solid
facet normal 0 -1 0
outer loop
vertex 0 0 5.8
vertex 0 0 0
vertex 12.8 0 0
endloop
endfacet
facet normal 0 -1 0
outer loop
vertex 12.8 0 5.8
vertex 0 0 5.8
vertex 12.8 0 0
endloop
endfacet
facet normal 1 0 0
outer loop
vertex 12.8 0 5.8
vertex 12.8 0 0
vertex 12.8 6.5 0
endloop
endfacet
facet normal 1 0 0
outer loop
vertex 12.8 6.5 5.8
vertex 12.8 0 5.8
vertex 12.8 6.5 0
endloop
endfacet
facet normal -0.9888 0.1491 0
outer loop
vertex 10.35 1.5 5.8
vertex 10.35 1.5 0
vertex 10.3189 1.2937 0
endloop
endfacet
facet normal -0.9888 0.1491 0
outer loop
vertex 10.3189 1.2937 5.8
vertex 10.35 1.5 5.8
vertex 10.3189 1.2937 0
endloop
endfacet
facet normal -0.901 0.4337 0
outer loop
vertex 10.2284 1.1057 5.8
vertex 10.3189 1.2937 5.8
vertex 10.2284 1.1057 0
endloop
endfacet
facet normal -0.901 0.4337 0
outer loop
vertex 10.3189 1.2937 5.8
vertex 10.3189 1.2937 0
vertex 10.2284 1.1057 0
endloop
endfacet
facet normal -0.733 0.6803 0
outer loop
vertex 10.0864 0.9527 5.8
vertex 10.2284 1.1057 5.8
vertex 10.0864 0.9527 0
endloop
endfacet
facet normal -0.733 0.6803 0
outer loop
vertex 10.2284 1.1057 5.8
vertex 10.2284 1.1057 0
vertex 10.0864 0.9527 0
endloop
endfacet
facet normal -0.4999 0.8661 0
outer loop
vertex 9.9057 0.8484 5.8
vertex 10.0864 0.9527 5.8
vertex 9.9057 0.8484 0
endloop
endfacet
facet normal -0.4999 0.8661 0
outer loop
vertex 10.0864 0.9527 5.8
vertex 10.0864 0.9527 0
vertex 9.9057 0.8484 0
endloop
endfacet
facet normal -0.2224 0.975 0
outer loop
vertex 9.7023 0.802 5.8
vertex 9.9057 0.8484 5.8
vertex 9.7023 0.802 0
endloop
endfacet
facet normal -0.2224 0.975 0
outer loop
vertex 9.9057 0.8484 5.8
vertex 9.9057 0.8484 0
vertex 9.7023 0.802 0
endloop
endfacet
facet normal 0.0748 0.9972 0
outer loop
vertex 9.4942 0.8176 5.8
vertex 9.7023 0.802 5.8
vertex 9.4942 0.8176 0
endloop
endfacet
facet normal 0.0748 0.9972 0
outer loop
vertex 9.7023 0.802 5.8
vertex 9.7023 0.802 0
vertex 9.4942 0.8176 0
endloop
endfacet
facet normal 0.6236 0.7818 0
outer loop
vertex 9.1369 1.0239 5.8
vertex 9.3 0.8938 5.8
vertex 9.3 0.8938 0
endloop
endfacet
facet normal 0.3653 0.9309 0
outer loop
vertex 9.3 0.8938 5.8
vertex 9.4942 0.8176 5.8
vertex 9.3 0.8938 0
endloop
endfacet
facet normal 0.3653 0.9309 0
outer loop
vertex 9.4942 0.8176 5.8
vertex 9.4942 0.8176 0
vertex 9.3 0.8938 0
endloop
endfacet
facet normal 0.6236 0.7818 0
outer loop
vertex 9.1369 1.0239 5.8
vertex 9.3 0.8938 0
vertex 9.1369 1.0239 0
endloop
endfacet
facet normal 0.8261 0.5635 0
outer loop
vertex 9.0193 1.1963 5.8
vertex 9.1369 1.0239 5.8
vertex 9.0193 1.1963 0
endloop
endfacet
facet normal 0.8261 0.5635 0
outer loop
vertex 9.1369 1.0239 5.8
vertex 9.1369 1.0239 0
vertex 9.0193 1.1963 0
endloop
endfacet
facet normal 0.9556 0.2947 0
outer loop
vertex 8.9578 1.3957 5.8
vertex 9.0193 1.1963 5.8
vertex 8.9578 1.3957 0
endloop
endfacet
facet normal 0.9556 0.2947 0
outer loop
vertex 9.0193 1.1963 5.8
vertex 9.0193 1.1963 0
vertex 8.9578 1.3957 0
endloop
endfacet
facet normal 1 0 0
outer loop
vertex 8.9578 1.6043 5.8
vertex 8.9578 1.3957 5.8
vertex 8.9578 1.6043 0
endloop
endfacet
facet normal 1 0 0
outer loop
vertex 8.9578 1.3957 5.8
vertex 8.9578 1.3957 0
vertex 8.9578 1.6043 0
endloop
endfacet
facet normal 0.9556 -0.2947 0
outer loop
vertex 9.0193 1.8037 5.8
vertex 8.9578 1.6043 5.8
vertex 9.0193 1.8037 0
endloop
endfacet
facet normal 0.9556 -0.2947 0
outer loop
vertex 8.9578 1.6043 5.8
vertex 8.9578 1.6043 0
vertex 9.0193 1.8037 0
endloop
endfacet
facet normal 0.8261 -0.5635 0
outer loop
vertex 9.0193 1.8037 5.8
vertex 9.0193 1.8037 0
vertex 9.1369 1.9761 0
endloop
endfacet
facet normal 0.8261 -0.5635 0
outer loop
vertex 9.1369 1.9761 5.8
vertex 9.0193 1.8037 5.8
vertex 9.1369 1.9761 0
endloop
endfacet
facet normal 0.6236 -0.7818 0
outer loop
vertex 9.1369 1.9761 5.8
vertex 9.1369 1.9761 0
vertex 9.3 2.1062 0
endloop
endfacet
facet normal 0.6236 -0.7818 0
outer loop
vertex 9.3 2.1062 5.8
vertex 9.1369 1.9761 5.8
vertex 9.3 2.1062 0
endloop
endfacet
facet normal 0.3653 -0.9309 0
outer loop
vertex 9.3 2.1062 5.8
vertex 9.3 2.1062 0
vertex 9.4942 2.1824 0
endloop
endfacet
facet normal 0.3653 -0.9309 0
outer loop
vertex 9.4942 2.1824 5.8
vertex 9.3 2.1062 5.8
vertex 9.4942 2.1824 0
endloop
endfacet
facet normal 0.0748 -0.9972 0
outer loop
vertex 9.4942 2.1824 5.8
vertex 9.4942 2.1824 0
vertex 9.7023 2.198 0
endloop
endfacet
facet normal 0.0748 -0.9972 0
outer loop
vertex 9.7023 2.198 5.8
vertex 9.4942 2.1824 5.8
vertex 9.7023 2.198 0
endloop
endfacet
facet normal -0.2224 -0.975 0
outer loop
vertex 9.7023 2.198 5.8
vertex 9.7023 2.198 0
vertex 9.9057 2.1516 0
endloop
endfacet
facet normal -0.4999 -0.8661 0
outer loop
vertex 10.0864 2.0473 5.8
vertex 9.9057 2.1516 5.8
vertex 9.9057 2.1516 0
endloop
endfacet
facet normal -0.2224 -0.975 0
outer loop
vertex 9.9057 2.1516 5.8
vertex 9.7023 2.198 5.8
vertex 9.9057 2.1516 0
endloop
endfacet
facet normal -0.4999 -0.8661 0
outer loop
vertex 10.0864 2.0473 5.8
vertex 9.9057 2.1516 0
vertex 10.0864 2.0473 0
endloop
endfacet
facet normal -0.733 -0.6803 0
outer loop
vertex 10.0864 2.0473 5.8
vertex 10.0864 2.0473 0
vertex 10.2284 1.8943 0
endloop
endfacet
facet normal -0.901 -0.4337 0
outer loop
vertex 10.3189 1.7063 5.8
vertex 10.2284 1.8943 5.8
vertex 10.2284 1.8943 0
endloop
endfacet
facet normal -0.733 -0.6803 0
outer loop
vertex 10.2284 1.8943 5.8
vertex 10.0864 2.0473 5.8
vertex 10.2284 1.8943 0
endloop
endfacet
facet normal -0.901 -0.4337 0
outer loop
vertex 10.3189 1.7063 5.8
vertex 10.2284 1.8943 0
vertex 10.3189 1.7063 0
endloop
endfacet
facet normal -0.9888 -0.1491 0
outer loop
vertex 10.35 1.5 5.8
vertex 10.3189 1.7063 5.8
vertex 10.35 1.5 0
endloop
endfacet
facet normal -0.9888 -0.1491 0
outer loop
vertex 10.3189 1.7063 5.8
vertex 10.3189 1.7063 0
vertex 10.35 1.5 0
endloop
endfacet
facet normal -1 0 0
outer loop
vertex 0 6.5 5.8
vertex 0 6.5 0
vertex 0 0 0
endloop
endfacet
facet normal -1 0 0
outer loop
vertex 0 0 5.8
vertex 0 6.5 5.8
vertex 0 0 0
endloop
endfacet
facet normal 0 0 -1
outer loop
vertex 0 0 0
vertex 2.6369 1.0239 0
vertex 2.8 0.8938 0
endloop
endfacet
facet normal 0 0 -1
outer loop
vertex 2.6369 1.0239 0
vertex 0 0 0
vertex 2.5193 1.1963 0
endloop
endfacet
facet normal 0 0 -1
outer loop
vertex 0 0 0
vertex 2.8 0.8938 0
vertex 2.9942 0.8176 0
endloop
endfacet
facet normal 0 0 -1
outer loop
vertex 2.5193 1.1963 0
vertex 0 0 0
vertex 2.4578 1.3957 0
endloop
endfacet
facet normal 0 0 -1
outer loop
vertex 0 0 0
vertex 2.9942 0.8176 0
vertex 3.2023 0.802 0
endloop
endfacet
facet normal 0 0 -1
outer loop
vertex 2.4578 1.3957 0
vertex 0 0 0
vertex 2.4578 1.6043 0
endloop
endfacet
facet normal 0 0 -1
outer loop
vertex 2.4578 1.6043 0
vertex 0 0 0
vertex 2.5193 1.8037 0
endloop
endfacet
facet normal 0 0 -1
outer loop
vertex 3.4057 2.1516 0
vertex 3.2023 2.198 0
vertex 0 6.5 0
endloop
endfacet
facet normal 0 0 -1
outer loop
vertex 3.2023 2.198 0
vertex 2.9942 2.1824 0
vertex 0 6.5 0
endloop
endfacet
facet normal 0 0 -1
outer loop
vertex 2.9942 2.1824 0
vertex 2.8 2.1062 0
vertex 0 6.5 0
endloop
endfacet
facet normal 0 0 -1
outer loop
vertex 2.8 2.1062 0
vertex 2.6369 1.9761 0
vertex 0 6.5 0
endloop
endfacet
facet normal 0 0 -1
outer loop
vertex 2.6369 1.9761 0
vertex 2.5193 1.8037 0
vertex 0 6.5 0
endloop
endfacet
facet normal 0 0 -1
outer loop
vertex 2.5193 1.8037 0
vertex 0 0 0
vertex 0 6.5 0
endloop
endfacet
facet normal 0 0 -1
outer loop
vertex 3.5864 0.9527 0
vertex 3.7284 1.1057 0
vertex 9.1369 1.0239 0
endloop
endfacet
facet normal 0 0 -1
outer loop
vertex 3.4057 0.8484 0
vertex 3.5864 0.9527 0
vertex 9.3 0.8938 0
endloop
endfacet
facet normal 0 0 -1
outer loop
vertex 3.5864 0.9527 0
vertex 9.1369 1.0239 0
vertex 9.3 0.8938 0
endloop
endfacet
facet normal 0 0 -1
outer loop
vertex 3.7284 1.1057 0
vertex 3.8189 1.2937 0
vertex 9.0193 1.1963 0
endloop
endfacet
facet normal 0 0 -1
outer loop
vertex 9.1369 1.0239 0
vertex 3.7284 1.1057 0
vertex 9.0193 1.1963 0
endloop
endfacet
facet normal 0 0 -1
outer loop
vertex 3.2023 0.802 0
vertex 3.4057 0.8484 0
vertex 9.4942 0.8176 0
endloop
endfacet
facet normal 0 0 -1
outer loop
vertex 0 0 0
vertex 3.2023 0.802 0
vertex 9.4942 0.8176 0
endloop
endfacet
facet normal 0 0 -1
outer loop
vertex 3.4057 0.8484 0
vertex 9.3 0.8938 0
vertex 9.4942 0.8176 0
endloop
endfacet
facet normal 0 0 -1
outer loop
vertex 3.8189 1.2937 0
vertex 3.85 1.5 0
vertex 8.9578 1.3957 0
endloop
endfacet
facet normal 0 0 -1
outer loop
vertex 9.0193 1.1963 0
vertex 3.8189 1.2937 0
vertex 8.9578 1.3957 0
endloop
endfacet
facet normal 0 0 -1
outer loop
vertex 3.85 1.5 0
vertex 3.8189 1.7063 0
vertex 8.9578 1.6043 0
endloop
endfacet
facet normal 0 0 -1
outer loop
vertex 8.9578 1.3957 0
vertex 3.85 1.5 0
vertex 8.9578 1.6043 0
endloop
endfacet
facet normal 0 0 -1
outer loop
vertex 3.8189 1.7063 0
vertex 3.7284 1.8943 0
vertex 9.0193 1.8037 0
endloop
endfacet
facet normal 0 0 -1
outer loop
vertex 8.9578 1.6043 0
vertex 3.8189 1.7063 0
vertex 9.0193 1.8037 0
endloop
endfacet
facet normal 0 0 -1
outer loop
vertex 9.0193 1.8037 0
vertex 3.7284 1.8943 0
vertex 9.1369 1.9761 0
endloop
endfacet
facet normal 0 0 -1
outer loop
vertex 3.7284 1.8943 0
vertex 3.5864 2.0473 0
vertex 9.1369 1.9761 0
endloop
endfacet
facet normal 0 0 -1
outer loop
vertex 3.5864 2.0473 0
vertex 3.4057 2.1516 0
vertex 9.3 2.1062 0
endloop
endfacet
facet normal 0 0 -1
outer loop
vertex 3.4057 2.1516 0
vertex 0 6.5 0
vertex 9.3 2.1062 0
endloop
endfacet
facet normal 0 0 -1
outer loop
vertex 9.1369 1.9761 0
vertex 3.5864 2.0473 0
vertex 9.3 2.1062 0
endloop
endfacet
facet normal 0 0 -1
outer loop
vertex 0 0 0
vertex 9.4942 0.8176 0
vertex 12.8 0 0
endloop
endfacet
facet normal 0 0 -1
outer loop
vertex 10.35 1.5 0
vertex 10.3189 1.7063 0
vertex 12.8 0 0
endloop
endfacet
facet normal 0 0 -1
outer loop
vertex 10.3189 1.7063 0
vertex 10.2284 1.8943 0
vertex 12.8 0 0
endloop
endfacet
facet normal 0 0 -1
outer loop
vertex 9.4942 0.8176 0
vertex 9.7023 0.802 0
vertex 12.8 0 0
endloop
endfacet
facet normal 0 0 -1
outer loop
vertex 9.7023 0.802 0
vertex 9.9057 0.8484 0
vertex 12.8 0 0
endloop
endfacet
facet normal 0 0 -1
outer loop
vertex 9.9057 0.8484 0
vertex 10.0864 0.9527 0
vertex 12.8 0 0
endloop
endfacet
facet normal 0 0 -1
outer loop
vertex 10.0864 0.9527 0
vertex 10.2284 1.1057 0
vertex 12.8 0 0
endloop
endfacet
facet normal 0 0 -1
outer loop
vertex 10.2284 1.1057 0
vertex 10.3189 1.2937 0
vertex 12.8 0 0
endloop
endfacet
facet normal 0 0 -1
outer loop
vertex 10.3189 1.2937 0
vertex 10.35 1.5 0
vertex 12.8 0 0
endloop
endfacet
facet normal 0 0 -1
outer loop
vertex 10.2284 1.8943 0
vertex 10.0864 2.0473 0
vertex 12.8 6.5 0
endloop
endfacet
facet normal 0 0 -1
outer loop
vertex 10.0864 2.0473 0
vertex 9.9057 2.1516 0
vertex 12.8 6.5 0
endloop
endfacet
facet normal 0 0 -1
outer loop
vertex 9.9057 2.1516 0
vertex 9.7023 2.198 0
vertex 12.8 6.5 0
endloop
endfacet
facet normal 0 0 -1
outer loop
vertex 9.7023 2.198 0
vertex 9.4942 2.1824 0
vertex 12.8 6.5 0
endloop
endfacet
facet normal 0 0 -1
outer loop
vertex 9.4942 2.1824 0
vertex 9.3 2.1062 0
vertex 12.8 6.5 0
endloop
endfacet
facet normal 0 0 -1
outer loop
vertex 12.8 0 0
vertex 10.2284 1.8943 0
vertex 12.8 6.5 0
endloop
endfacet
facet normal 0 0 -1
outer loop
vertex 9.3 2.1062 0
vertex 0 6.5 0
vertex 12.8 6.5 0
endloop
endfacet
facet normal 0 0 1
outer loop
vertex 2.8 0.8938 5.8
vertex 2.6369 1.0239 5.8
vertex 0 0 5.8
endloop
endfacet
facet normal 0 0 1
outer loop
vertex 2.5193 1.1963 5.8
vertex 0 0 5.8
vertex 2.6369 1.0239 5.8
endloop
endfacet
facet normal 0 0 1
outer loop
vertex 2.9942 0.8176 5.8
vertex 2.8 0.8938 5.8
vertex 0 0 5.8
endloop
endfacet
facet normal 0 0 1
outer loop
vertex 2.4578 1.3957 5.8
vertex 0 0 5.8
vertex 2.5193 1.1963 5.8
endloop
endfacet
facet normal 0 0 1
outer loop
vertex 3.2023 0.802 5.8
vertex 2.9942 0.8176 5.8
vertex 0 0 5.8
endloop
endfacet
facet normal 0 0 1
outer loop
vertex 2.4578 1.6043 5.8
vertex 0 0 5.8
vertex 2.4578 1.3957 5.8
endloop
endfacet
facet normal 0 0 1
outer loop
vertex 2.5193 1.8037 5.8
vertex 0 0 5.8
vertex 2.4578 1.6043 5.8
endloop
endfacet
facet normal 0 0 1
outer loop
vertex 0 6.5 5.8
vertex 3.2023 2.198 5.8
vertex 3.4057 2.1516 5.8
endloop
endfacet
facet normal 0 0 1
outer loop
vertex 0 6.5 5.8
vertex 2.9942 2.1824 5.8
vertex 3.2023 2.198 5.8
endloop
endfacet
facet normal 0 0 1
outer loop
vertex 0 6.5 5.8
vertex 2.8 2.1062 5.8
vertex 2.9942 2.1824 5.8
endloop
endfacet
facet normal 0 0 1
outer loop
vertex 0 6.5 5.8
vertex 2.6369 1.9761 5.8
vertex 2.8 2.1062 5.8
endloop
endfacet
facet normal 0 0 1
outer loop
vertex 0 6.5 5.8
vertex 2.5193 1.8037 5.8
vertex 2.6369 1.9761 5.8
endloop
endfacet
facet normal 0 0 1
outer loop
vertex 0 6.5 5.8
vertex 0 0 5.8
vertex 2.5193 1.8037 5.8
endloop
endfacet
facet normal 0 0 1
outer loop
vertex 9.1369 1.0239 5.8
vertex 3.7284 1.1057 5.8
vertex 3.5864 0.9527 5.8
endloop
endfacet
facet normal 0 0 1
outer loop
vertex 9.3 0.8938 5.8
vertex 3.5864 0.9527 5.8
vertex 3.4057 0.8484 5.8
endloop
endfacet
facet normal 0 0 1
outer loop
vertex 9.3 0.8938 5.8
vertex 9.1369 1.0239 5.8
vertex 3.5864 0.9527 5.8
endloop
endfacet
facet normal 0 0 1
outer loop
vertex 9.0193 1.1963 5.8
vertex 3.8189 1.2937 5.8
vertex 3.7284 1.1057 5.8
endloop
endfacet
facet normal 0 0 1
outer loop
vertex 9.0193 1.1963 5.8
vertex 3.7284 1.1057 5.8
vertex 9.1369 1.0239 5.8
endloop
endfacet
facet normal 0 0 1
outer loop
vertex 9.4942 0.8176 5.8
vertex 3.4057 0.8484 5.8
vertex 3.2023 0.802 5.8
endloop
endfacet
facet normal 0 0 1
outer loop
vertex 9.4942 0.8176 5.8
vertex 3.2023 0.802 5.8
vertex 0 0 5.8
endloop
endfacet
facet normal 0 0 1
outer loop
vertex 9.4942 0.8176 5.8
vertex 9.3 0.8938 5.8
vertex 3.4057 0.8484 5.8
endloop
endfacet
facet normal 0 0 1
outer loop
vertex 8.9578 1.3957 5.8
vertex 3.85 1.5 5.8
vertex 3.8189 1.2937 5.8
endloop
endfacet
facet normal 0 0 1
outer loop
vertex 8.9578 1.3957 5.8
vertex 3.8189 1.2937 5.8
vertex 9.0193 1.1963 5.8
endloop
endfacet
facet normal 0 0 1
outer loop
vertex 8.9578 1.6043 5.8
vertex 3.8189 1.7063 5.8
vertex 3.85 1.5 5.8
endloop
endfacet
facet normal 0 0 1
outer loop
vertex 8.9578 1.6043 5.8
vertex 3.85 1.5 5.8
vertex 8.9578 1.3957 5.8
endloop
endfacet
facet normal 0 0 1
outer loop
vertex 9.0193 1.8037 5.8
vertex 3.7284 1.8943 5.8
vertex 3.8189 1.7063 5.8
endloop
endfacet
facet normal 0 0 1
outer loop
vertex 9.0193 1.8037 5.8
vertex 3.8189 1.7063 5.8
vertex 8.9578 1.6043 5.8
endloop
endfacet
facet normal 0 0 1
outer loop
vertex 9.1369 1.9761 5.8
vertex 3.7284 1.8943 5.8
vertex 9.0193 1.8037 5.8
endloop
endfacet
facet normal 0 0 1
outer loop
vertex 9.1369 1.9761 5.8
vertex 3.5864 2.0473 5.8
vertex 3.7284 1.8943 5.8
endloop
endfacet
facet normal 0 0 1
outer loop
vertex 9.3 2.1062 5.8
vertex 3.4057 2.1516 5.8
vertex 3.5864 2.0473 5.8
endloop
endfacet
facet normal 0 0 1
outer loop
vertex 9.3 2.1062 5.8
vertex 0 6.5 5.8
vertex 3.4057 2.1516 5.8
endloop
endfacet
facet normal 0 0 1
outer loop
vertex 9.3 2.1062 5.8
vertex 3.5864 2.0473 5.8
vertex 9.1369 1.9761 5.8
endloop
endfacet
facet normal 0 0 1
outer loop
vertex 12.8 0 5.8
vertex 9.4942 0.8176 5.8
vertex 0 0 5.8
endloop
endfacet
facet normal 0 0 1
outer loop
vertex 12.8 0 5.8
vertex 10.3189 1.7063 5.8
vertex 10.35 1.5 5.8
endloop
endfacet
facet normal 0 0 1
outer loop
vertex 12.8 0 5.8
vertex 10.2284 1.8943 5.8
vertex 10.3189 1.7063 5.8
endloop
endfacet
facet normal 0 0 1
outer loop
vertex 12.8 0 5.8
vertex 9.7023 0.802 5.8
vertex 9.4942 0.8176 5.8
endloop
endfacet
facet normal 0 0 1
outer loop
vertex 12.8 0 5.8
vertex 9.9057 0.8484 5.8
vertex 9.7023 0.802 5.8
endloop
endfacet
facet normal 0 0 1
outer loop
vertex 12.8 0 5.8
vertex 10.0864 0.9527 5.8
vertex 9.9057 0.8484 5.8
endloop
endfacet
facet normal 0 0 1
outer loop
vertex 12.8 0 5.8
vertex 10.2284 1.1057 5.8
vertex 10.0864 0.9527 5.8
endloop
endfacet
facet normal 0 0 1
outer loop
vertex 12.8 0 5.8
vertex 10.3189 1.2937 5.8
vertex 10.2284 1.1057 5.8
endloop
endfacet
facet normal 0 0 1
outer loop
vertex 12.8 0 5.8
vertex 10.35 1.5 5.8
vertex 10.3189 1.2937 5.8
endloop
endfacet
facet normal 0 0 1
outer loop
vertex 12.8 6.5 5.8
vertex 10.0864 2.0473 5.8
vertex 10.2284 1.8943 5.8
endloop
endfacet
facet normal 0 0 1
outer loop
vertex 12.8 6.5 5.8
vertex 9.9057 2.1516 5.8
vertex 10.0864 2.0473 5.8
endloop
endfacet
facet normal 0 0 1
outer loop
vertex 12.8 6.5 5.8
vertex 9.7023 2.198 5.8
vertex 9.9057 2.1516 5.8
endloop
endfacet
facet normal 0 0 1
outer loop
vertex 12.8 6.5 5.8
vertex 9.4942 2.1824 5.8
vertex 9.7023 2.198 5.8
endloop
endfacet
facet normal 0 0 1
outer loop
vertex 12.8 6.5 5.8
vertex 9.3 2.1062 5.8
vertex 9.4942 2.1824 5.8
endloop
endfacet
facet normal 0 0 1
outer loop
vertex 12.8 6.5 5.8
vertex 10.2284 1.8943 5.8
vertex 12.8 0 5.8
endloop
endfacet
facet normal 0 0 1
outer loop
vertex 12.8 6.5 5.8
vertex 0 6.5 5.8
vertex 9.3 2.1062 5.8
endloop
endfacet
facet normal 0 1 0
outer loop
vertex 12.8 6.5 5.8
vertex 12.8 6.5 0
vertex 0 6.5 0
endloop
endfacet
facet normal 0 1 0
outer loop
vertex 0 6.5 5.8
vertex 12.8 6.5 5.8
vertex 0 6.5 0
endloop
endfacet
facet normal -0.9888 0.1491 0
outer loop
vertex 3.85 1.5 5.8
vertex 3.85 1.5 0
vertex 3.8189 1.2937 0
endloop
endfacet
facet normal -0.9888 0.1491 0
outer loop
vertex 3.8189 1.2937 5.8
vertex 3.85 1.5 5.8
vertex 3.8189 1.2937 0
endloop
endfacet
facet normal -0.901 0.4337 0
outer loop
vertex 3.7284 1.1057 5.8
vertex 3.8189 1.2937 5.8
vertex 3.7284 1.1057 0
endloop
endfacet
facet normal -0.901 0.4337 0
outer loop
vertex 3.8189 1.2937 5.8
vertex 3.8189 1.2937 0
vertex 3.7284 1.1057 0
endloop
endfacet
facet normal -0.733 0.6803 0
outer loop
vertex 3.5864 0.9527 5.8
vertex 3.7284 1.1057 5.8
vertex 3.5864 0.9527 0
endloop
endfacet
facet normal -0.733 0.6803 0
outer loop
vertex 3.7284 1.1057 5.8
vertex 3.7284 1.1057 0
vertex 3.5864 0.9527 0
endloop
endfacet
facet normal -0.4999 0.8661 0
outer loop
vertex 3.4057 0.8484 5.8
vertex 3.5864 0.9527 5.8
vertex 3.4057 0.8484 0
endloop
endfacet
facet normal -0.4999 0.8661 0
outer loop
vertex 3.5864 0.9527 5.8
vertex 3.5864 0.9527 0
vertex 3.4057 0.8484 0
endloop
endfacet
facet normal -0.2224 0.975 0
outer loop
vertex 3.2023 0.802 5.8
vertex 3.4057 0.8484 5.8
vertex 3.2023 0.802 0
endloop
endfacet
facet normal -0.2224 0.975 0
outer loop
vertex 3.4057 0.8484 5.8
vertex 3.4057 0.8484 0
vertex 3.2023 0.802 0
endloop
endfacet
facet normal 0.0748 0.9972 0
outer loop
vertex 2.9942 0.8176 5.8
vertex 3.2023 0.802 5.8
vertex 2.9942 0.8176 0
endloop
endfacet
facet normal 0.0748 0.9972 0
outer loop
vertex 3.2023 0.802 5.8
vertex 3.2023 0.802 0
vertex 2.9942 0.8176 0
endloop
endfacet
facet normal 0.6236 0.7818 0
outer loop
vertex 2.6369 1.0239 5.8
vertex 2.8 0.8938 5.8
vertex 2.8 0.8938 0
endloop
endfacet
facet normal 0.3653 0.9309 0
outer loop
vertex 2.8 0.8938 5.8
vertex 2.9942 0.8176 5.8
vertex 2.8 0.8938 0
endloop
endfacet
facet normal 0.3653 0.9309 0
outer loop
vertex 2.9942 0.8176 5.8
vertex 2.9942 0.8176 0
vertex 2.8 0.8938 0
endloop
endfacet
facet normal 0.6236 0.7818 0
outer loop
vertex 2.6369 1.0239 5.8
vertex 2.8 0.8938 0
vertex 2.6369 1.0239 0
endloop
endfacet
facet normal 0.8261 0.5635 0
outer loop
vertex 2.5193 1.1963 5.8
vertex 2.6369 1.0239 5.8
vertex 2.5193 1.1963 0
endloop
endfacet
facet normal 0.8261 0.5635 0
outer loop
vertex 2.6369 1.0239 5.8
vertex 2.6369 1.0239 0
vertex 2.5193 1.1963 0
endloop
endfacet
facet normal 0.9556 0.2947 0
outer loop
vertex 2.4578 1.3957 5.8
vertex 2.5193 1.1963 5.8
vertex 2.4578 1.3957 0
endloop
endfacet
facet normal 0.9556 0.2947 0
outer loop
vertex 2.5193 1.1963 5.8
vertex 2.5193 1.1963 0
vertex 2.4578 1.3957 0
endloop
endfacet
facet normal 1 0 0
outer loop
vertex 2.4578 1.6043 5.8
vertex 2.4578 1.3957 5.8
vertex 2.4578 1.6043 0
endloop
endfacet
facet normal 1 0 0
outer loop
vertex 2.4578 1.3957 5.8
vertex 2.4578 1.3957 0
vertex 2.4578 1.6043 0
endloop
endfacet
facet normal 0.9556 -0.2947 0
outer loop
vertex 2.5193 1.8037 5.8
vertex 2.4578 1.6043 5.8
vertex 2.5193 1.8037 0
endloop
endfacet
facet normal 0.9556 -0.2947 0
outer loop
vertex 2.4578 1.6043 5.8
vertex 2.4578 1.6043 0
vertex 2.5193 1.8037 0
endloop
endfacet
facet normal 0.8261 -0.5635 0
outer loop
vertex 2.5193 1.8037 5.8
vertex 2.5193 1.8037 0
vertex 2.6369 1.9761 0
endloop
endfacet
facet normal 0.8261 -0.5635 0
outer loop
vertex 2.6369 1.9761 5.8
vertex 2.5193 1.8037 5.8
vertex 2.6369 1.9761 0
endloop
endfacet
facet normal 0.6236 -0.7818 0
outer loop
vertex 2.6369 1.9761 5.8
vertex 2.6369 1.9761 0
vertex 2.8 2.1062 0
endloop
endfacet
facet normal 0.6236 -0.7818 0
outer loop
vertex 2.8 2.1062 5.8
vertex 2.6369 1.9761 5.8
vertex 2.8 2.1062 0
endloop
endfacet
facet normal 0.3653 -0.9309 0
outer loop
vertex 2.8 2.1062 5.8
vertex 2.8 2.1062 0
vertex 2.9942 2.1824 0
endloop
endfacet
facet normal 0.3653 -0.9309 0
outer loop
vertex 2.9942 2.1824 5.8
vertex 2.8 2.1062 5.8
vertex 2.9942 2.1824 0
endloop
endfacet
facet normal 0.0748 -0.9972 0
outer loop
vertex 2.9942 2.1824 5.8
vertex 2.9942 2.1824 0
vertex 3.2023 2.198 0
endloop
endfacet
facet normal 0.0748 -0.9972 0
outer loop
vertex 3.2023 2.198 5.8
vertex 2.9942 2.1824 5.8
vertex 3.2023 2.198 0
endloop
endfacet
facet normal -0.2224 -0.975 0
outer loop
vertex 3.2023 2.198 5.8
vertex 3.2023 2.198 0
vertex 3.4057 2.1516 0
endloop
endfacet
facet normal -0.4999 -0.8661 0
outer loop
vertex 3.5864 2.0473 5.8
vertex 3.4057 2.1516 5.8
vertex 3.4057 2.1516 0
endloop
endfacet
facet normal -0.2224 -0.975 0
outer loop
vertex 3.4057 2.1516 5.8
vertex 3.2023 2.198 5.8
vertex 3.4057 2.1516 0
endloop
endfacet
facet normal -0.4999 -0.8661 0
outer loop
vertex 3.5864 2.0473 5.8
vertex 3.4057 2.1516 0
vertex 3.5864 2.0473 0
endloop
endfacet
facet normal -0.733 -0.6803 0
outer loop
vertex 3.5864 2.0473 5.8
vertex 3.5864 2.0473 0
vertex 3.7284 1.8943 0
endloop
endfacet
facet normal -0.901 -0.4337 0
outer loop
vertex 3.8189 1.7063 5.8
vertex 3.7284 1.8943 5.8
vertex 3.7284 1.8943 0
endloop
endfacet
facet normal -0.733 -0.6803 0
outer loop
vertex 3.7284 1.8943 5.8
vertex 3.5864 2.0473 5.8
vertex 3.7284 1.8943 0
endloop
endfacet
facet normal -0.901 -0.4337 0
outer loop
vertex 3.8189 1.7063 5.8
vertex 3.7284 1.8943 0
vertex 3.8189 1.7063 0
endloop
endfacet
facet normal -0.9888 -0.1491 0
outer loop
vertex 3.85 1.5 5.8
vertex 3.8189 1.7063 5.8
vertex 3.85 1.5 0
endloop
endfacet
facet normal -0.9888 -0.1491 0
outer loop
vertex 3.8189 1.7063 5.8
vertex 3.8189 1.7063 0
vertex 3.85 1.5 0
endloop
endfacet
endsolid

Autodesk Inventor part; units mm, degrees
ref_plane "YZ Plane" through (0, 0, 0) normal (1, 0, 0) x (0, 1, 0)
ref_plane "XZ Plane" through (0, 0, 0) normal (0, 1, 0) x (-1, 0, 0)
ref_plane "XY Plane" through (0, 0, 0) normal (0, 0, 1) x (1, 0, 0)
sketch "Skizze1" plane through (0, 0, 0) normal (0, 0, 1) x (1, 0, 0)
  line L0 (0, 0) -> (12.8, 0)
  line L1 (12.8, 0) -> (12.8, 6.5)
  line L2 (12.8, 6.5) -> (0, 6.5)
  line L3 (0, 6.5) -> (0, 0)
  circle A0 centre (3.15, 1.5) radius 0.7
  circle A1 centre (9.65, 1.5) radius 0.7
  line L4 (3.15, 1.5) -> (9.65, 1.5) construction
  line L5 (6.4, 0) -> (6.4, 6.5) construction
  dimension "d0" = 12.8
  dimension "d1" = 6.5
  dimension "d2" = 1.5
  dimension "d3" = 3.15
  dimension "d4" = 6.5
  dimension "d7" = 1.4
extrude "Extrusion1" add sketch "Skizze1" along normal blind 5.8
ref_plane "Arbeitsebene1" through (0, 0, 2.9) normal (0, 0, 1) x (1, 0, 0)
sketch "Skizze2" plane through (0, 0, 2.9) normal (0, 0, 1) x (1, 0, 0)
  circle A0 centre (3.15, 1.5) radius 0.7 construction
  line L0 (0, 0) -> (12.8, 0) projected
  line L1 (13.95, 8.3) -> (1, 6.5)
  line L2 (12.8, 6.5) -> (0, 6.5) projected
  line L3 (13.95, 11.5) -> (1, 6.5) construction
  line L4 (0, 6.5) -> (0, 0) projected
  line L5 (13.95, 8.3) -> (14.0188, 7.8048)
  line L6 (14.0188, 7.8048) -> (1.0688, 6.0048)
  line L7 (1.0688, 6.0048) -> (1, 6.5)
  point P0 (4.6318, 6.5)
  dimension "d8" = 10.8
  dimension "d9" = 10.8
  dimension "d10" = 8.3
  dimension "d11" = 11.5
  dimension "d12" = 1
  dimension "d13" = 0.5
equation "\"d9\" = d8"
properties part number "LimitSwitch"
